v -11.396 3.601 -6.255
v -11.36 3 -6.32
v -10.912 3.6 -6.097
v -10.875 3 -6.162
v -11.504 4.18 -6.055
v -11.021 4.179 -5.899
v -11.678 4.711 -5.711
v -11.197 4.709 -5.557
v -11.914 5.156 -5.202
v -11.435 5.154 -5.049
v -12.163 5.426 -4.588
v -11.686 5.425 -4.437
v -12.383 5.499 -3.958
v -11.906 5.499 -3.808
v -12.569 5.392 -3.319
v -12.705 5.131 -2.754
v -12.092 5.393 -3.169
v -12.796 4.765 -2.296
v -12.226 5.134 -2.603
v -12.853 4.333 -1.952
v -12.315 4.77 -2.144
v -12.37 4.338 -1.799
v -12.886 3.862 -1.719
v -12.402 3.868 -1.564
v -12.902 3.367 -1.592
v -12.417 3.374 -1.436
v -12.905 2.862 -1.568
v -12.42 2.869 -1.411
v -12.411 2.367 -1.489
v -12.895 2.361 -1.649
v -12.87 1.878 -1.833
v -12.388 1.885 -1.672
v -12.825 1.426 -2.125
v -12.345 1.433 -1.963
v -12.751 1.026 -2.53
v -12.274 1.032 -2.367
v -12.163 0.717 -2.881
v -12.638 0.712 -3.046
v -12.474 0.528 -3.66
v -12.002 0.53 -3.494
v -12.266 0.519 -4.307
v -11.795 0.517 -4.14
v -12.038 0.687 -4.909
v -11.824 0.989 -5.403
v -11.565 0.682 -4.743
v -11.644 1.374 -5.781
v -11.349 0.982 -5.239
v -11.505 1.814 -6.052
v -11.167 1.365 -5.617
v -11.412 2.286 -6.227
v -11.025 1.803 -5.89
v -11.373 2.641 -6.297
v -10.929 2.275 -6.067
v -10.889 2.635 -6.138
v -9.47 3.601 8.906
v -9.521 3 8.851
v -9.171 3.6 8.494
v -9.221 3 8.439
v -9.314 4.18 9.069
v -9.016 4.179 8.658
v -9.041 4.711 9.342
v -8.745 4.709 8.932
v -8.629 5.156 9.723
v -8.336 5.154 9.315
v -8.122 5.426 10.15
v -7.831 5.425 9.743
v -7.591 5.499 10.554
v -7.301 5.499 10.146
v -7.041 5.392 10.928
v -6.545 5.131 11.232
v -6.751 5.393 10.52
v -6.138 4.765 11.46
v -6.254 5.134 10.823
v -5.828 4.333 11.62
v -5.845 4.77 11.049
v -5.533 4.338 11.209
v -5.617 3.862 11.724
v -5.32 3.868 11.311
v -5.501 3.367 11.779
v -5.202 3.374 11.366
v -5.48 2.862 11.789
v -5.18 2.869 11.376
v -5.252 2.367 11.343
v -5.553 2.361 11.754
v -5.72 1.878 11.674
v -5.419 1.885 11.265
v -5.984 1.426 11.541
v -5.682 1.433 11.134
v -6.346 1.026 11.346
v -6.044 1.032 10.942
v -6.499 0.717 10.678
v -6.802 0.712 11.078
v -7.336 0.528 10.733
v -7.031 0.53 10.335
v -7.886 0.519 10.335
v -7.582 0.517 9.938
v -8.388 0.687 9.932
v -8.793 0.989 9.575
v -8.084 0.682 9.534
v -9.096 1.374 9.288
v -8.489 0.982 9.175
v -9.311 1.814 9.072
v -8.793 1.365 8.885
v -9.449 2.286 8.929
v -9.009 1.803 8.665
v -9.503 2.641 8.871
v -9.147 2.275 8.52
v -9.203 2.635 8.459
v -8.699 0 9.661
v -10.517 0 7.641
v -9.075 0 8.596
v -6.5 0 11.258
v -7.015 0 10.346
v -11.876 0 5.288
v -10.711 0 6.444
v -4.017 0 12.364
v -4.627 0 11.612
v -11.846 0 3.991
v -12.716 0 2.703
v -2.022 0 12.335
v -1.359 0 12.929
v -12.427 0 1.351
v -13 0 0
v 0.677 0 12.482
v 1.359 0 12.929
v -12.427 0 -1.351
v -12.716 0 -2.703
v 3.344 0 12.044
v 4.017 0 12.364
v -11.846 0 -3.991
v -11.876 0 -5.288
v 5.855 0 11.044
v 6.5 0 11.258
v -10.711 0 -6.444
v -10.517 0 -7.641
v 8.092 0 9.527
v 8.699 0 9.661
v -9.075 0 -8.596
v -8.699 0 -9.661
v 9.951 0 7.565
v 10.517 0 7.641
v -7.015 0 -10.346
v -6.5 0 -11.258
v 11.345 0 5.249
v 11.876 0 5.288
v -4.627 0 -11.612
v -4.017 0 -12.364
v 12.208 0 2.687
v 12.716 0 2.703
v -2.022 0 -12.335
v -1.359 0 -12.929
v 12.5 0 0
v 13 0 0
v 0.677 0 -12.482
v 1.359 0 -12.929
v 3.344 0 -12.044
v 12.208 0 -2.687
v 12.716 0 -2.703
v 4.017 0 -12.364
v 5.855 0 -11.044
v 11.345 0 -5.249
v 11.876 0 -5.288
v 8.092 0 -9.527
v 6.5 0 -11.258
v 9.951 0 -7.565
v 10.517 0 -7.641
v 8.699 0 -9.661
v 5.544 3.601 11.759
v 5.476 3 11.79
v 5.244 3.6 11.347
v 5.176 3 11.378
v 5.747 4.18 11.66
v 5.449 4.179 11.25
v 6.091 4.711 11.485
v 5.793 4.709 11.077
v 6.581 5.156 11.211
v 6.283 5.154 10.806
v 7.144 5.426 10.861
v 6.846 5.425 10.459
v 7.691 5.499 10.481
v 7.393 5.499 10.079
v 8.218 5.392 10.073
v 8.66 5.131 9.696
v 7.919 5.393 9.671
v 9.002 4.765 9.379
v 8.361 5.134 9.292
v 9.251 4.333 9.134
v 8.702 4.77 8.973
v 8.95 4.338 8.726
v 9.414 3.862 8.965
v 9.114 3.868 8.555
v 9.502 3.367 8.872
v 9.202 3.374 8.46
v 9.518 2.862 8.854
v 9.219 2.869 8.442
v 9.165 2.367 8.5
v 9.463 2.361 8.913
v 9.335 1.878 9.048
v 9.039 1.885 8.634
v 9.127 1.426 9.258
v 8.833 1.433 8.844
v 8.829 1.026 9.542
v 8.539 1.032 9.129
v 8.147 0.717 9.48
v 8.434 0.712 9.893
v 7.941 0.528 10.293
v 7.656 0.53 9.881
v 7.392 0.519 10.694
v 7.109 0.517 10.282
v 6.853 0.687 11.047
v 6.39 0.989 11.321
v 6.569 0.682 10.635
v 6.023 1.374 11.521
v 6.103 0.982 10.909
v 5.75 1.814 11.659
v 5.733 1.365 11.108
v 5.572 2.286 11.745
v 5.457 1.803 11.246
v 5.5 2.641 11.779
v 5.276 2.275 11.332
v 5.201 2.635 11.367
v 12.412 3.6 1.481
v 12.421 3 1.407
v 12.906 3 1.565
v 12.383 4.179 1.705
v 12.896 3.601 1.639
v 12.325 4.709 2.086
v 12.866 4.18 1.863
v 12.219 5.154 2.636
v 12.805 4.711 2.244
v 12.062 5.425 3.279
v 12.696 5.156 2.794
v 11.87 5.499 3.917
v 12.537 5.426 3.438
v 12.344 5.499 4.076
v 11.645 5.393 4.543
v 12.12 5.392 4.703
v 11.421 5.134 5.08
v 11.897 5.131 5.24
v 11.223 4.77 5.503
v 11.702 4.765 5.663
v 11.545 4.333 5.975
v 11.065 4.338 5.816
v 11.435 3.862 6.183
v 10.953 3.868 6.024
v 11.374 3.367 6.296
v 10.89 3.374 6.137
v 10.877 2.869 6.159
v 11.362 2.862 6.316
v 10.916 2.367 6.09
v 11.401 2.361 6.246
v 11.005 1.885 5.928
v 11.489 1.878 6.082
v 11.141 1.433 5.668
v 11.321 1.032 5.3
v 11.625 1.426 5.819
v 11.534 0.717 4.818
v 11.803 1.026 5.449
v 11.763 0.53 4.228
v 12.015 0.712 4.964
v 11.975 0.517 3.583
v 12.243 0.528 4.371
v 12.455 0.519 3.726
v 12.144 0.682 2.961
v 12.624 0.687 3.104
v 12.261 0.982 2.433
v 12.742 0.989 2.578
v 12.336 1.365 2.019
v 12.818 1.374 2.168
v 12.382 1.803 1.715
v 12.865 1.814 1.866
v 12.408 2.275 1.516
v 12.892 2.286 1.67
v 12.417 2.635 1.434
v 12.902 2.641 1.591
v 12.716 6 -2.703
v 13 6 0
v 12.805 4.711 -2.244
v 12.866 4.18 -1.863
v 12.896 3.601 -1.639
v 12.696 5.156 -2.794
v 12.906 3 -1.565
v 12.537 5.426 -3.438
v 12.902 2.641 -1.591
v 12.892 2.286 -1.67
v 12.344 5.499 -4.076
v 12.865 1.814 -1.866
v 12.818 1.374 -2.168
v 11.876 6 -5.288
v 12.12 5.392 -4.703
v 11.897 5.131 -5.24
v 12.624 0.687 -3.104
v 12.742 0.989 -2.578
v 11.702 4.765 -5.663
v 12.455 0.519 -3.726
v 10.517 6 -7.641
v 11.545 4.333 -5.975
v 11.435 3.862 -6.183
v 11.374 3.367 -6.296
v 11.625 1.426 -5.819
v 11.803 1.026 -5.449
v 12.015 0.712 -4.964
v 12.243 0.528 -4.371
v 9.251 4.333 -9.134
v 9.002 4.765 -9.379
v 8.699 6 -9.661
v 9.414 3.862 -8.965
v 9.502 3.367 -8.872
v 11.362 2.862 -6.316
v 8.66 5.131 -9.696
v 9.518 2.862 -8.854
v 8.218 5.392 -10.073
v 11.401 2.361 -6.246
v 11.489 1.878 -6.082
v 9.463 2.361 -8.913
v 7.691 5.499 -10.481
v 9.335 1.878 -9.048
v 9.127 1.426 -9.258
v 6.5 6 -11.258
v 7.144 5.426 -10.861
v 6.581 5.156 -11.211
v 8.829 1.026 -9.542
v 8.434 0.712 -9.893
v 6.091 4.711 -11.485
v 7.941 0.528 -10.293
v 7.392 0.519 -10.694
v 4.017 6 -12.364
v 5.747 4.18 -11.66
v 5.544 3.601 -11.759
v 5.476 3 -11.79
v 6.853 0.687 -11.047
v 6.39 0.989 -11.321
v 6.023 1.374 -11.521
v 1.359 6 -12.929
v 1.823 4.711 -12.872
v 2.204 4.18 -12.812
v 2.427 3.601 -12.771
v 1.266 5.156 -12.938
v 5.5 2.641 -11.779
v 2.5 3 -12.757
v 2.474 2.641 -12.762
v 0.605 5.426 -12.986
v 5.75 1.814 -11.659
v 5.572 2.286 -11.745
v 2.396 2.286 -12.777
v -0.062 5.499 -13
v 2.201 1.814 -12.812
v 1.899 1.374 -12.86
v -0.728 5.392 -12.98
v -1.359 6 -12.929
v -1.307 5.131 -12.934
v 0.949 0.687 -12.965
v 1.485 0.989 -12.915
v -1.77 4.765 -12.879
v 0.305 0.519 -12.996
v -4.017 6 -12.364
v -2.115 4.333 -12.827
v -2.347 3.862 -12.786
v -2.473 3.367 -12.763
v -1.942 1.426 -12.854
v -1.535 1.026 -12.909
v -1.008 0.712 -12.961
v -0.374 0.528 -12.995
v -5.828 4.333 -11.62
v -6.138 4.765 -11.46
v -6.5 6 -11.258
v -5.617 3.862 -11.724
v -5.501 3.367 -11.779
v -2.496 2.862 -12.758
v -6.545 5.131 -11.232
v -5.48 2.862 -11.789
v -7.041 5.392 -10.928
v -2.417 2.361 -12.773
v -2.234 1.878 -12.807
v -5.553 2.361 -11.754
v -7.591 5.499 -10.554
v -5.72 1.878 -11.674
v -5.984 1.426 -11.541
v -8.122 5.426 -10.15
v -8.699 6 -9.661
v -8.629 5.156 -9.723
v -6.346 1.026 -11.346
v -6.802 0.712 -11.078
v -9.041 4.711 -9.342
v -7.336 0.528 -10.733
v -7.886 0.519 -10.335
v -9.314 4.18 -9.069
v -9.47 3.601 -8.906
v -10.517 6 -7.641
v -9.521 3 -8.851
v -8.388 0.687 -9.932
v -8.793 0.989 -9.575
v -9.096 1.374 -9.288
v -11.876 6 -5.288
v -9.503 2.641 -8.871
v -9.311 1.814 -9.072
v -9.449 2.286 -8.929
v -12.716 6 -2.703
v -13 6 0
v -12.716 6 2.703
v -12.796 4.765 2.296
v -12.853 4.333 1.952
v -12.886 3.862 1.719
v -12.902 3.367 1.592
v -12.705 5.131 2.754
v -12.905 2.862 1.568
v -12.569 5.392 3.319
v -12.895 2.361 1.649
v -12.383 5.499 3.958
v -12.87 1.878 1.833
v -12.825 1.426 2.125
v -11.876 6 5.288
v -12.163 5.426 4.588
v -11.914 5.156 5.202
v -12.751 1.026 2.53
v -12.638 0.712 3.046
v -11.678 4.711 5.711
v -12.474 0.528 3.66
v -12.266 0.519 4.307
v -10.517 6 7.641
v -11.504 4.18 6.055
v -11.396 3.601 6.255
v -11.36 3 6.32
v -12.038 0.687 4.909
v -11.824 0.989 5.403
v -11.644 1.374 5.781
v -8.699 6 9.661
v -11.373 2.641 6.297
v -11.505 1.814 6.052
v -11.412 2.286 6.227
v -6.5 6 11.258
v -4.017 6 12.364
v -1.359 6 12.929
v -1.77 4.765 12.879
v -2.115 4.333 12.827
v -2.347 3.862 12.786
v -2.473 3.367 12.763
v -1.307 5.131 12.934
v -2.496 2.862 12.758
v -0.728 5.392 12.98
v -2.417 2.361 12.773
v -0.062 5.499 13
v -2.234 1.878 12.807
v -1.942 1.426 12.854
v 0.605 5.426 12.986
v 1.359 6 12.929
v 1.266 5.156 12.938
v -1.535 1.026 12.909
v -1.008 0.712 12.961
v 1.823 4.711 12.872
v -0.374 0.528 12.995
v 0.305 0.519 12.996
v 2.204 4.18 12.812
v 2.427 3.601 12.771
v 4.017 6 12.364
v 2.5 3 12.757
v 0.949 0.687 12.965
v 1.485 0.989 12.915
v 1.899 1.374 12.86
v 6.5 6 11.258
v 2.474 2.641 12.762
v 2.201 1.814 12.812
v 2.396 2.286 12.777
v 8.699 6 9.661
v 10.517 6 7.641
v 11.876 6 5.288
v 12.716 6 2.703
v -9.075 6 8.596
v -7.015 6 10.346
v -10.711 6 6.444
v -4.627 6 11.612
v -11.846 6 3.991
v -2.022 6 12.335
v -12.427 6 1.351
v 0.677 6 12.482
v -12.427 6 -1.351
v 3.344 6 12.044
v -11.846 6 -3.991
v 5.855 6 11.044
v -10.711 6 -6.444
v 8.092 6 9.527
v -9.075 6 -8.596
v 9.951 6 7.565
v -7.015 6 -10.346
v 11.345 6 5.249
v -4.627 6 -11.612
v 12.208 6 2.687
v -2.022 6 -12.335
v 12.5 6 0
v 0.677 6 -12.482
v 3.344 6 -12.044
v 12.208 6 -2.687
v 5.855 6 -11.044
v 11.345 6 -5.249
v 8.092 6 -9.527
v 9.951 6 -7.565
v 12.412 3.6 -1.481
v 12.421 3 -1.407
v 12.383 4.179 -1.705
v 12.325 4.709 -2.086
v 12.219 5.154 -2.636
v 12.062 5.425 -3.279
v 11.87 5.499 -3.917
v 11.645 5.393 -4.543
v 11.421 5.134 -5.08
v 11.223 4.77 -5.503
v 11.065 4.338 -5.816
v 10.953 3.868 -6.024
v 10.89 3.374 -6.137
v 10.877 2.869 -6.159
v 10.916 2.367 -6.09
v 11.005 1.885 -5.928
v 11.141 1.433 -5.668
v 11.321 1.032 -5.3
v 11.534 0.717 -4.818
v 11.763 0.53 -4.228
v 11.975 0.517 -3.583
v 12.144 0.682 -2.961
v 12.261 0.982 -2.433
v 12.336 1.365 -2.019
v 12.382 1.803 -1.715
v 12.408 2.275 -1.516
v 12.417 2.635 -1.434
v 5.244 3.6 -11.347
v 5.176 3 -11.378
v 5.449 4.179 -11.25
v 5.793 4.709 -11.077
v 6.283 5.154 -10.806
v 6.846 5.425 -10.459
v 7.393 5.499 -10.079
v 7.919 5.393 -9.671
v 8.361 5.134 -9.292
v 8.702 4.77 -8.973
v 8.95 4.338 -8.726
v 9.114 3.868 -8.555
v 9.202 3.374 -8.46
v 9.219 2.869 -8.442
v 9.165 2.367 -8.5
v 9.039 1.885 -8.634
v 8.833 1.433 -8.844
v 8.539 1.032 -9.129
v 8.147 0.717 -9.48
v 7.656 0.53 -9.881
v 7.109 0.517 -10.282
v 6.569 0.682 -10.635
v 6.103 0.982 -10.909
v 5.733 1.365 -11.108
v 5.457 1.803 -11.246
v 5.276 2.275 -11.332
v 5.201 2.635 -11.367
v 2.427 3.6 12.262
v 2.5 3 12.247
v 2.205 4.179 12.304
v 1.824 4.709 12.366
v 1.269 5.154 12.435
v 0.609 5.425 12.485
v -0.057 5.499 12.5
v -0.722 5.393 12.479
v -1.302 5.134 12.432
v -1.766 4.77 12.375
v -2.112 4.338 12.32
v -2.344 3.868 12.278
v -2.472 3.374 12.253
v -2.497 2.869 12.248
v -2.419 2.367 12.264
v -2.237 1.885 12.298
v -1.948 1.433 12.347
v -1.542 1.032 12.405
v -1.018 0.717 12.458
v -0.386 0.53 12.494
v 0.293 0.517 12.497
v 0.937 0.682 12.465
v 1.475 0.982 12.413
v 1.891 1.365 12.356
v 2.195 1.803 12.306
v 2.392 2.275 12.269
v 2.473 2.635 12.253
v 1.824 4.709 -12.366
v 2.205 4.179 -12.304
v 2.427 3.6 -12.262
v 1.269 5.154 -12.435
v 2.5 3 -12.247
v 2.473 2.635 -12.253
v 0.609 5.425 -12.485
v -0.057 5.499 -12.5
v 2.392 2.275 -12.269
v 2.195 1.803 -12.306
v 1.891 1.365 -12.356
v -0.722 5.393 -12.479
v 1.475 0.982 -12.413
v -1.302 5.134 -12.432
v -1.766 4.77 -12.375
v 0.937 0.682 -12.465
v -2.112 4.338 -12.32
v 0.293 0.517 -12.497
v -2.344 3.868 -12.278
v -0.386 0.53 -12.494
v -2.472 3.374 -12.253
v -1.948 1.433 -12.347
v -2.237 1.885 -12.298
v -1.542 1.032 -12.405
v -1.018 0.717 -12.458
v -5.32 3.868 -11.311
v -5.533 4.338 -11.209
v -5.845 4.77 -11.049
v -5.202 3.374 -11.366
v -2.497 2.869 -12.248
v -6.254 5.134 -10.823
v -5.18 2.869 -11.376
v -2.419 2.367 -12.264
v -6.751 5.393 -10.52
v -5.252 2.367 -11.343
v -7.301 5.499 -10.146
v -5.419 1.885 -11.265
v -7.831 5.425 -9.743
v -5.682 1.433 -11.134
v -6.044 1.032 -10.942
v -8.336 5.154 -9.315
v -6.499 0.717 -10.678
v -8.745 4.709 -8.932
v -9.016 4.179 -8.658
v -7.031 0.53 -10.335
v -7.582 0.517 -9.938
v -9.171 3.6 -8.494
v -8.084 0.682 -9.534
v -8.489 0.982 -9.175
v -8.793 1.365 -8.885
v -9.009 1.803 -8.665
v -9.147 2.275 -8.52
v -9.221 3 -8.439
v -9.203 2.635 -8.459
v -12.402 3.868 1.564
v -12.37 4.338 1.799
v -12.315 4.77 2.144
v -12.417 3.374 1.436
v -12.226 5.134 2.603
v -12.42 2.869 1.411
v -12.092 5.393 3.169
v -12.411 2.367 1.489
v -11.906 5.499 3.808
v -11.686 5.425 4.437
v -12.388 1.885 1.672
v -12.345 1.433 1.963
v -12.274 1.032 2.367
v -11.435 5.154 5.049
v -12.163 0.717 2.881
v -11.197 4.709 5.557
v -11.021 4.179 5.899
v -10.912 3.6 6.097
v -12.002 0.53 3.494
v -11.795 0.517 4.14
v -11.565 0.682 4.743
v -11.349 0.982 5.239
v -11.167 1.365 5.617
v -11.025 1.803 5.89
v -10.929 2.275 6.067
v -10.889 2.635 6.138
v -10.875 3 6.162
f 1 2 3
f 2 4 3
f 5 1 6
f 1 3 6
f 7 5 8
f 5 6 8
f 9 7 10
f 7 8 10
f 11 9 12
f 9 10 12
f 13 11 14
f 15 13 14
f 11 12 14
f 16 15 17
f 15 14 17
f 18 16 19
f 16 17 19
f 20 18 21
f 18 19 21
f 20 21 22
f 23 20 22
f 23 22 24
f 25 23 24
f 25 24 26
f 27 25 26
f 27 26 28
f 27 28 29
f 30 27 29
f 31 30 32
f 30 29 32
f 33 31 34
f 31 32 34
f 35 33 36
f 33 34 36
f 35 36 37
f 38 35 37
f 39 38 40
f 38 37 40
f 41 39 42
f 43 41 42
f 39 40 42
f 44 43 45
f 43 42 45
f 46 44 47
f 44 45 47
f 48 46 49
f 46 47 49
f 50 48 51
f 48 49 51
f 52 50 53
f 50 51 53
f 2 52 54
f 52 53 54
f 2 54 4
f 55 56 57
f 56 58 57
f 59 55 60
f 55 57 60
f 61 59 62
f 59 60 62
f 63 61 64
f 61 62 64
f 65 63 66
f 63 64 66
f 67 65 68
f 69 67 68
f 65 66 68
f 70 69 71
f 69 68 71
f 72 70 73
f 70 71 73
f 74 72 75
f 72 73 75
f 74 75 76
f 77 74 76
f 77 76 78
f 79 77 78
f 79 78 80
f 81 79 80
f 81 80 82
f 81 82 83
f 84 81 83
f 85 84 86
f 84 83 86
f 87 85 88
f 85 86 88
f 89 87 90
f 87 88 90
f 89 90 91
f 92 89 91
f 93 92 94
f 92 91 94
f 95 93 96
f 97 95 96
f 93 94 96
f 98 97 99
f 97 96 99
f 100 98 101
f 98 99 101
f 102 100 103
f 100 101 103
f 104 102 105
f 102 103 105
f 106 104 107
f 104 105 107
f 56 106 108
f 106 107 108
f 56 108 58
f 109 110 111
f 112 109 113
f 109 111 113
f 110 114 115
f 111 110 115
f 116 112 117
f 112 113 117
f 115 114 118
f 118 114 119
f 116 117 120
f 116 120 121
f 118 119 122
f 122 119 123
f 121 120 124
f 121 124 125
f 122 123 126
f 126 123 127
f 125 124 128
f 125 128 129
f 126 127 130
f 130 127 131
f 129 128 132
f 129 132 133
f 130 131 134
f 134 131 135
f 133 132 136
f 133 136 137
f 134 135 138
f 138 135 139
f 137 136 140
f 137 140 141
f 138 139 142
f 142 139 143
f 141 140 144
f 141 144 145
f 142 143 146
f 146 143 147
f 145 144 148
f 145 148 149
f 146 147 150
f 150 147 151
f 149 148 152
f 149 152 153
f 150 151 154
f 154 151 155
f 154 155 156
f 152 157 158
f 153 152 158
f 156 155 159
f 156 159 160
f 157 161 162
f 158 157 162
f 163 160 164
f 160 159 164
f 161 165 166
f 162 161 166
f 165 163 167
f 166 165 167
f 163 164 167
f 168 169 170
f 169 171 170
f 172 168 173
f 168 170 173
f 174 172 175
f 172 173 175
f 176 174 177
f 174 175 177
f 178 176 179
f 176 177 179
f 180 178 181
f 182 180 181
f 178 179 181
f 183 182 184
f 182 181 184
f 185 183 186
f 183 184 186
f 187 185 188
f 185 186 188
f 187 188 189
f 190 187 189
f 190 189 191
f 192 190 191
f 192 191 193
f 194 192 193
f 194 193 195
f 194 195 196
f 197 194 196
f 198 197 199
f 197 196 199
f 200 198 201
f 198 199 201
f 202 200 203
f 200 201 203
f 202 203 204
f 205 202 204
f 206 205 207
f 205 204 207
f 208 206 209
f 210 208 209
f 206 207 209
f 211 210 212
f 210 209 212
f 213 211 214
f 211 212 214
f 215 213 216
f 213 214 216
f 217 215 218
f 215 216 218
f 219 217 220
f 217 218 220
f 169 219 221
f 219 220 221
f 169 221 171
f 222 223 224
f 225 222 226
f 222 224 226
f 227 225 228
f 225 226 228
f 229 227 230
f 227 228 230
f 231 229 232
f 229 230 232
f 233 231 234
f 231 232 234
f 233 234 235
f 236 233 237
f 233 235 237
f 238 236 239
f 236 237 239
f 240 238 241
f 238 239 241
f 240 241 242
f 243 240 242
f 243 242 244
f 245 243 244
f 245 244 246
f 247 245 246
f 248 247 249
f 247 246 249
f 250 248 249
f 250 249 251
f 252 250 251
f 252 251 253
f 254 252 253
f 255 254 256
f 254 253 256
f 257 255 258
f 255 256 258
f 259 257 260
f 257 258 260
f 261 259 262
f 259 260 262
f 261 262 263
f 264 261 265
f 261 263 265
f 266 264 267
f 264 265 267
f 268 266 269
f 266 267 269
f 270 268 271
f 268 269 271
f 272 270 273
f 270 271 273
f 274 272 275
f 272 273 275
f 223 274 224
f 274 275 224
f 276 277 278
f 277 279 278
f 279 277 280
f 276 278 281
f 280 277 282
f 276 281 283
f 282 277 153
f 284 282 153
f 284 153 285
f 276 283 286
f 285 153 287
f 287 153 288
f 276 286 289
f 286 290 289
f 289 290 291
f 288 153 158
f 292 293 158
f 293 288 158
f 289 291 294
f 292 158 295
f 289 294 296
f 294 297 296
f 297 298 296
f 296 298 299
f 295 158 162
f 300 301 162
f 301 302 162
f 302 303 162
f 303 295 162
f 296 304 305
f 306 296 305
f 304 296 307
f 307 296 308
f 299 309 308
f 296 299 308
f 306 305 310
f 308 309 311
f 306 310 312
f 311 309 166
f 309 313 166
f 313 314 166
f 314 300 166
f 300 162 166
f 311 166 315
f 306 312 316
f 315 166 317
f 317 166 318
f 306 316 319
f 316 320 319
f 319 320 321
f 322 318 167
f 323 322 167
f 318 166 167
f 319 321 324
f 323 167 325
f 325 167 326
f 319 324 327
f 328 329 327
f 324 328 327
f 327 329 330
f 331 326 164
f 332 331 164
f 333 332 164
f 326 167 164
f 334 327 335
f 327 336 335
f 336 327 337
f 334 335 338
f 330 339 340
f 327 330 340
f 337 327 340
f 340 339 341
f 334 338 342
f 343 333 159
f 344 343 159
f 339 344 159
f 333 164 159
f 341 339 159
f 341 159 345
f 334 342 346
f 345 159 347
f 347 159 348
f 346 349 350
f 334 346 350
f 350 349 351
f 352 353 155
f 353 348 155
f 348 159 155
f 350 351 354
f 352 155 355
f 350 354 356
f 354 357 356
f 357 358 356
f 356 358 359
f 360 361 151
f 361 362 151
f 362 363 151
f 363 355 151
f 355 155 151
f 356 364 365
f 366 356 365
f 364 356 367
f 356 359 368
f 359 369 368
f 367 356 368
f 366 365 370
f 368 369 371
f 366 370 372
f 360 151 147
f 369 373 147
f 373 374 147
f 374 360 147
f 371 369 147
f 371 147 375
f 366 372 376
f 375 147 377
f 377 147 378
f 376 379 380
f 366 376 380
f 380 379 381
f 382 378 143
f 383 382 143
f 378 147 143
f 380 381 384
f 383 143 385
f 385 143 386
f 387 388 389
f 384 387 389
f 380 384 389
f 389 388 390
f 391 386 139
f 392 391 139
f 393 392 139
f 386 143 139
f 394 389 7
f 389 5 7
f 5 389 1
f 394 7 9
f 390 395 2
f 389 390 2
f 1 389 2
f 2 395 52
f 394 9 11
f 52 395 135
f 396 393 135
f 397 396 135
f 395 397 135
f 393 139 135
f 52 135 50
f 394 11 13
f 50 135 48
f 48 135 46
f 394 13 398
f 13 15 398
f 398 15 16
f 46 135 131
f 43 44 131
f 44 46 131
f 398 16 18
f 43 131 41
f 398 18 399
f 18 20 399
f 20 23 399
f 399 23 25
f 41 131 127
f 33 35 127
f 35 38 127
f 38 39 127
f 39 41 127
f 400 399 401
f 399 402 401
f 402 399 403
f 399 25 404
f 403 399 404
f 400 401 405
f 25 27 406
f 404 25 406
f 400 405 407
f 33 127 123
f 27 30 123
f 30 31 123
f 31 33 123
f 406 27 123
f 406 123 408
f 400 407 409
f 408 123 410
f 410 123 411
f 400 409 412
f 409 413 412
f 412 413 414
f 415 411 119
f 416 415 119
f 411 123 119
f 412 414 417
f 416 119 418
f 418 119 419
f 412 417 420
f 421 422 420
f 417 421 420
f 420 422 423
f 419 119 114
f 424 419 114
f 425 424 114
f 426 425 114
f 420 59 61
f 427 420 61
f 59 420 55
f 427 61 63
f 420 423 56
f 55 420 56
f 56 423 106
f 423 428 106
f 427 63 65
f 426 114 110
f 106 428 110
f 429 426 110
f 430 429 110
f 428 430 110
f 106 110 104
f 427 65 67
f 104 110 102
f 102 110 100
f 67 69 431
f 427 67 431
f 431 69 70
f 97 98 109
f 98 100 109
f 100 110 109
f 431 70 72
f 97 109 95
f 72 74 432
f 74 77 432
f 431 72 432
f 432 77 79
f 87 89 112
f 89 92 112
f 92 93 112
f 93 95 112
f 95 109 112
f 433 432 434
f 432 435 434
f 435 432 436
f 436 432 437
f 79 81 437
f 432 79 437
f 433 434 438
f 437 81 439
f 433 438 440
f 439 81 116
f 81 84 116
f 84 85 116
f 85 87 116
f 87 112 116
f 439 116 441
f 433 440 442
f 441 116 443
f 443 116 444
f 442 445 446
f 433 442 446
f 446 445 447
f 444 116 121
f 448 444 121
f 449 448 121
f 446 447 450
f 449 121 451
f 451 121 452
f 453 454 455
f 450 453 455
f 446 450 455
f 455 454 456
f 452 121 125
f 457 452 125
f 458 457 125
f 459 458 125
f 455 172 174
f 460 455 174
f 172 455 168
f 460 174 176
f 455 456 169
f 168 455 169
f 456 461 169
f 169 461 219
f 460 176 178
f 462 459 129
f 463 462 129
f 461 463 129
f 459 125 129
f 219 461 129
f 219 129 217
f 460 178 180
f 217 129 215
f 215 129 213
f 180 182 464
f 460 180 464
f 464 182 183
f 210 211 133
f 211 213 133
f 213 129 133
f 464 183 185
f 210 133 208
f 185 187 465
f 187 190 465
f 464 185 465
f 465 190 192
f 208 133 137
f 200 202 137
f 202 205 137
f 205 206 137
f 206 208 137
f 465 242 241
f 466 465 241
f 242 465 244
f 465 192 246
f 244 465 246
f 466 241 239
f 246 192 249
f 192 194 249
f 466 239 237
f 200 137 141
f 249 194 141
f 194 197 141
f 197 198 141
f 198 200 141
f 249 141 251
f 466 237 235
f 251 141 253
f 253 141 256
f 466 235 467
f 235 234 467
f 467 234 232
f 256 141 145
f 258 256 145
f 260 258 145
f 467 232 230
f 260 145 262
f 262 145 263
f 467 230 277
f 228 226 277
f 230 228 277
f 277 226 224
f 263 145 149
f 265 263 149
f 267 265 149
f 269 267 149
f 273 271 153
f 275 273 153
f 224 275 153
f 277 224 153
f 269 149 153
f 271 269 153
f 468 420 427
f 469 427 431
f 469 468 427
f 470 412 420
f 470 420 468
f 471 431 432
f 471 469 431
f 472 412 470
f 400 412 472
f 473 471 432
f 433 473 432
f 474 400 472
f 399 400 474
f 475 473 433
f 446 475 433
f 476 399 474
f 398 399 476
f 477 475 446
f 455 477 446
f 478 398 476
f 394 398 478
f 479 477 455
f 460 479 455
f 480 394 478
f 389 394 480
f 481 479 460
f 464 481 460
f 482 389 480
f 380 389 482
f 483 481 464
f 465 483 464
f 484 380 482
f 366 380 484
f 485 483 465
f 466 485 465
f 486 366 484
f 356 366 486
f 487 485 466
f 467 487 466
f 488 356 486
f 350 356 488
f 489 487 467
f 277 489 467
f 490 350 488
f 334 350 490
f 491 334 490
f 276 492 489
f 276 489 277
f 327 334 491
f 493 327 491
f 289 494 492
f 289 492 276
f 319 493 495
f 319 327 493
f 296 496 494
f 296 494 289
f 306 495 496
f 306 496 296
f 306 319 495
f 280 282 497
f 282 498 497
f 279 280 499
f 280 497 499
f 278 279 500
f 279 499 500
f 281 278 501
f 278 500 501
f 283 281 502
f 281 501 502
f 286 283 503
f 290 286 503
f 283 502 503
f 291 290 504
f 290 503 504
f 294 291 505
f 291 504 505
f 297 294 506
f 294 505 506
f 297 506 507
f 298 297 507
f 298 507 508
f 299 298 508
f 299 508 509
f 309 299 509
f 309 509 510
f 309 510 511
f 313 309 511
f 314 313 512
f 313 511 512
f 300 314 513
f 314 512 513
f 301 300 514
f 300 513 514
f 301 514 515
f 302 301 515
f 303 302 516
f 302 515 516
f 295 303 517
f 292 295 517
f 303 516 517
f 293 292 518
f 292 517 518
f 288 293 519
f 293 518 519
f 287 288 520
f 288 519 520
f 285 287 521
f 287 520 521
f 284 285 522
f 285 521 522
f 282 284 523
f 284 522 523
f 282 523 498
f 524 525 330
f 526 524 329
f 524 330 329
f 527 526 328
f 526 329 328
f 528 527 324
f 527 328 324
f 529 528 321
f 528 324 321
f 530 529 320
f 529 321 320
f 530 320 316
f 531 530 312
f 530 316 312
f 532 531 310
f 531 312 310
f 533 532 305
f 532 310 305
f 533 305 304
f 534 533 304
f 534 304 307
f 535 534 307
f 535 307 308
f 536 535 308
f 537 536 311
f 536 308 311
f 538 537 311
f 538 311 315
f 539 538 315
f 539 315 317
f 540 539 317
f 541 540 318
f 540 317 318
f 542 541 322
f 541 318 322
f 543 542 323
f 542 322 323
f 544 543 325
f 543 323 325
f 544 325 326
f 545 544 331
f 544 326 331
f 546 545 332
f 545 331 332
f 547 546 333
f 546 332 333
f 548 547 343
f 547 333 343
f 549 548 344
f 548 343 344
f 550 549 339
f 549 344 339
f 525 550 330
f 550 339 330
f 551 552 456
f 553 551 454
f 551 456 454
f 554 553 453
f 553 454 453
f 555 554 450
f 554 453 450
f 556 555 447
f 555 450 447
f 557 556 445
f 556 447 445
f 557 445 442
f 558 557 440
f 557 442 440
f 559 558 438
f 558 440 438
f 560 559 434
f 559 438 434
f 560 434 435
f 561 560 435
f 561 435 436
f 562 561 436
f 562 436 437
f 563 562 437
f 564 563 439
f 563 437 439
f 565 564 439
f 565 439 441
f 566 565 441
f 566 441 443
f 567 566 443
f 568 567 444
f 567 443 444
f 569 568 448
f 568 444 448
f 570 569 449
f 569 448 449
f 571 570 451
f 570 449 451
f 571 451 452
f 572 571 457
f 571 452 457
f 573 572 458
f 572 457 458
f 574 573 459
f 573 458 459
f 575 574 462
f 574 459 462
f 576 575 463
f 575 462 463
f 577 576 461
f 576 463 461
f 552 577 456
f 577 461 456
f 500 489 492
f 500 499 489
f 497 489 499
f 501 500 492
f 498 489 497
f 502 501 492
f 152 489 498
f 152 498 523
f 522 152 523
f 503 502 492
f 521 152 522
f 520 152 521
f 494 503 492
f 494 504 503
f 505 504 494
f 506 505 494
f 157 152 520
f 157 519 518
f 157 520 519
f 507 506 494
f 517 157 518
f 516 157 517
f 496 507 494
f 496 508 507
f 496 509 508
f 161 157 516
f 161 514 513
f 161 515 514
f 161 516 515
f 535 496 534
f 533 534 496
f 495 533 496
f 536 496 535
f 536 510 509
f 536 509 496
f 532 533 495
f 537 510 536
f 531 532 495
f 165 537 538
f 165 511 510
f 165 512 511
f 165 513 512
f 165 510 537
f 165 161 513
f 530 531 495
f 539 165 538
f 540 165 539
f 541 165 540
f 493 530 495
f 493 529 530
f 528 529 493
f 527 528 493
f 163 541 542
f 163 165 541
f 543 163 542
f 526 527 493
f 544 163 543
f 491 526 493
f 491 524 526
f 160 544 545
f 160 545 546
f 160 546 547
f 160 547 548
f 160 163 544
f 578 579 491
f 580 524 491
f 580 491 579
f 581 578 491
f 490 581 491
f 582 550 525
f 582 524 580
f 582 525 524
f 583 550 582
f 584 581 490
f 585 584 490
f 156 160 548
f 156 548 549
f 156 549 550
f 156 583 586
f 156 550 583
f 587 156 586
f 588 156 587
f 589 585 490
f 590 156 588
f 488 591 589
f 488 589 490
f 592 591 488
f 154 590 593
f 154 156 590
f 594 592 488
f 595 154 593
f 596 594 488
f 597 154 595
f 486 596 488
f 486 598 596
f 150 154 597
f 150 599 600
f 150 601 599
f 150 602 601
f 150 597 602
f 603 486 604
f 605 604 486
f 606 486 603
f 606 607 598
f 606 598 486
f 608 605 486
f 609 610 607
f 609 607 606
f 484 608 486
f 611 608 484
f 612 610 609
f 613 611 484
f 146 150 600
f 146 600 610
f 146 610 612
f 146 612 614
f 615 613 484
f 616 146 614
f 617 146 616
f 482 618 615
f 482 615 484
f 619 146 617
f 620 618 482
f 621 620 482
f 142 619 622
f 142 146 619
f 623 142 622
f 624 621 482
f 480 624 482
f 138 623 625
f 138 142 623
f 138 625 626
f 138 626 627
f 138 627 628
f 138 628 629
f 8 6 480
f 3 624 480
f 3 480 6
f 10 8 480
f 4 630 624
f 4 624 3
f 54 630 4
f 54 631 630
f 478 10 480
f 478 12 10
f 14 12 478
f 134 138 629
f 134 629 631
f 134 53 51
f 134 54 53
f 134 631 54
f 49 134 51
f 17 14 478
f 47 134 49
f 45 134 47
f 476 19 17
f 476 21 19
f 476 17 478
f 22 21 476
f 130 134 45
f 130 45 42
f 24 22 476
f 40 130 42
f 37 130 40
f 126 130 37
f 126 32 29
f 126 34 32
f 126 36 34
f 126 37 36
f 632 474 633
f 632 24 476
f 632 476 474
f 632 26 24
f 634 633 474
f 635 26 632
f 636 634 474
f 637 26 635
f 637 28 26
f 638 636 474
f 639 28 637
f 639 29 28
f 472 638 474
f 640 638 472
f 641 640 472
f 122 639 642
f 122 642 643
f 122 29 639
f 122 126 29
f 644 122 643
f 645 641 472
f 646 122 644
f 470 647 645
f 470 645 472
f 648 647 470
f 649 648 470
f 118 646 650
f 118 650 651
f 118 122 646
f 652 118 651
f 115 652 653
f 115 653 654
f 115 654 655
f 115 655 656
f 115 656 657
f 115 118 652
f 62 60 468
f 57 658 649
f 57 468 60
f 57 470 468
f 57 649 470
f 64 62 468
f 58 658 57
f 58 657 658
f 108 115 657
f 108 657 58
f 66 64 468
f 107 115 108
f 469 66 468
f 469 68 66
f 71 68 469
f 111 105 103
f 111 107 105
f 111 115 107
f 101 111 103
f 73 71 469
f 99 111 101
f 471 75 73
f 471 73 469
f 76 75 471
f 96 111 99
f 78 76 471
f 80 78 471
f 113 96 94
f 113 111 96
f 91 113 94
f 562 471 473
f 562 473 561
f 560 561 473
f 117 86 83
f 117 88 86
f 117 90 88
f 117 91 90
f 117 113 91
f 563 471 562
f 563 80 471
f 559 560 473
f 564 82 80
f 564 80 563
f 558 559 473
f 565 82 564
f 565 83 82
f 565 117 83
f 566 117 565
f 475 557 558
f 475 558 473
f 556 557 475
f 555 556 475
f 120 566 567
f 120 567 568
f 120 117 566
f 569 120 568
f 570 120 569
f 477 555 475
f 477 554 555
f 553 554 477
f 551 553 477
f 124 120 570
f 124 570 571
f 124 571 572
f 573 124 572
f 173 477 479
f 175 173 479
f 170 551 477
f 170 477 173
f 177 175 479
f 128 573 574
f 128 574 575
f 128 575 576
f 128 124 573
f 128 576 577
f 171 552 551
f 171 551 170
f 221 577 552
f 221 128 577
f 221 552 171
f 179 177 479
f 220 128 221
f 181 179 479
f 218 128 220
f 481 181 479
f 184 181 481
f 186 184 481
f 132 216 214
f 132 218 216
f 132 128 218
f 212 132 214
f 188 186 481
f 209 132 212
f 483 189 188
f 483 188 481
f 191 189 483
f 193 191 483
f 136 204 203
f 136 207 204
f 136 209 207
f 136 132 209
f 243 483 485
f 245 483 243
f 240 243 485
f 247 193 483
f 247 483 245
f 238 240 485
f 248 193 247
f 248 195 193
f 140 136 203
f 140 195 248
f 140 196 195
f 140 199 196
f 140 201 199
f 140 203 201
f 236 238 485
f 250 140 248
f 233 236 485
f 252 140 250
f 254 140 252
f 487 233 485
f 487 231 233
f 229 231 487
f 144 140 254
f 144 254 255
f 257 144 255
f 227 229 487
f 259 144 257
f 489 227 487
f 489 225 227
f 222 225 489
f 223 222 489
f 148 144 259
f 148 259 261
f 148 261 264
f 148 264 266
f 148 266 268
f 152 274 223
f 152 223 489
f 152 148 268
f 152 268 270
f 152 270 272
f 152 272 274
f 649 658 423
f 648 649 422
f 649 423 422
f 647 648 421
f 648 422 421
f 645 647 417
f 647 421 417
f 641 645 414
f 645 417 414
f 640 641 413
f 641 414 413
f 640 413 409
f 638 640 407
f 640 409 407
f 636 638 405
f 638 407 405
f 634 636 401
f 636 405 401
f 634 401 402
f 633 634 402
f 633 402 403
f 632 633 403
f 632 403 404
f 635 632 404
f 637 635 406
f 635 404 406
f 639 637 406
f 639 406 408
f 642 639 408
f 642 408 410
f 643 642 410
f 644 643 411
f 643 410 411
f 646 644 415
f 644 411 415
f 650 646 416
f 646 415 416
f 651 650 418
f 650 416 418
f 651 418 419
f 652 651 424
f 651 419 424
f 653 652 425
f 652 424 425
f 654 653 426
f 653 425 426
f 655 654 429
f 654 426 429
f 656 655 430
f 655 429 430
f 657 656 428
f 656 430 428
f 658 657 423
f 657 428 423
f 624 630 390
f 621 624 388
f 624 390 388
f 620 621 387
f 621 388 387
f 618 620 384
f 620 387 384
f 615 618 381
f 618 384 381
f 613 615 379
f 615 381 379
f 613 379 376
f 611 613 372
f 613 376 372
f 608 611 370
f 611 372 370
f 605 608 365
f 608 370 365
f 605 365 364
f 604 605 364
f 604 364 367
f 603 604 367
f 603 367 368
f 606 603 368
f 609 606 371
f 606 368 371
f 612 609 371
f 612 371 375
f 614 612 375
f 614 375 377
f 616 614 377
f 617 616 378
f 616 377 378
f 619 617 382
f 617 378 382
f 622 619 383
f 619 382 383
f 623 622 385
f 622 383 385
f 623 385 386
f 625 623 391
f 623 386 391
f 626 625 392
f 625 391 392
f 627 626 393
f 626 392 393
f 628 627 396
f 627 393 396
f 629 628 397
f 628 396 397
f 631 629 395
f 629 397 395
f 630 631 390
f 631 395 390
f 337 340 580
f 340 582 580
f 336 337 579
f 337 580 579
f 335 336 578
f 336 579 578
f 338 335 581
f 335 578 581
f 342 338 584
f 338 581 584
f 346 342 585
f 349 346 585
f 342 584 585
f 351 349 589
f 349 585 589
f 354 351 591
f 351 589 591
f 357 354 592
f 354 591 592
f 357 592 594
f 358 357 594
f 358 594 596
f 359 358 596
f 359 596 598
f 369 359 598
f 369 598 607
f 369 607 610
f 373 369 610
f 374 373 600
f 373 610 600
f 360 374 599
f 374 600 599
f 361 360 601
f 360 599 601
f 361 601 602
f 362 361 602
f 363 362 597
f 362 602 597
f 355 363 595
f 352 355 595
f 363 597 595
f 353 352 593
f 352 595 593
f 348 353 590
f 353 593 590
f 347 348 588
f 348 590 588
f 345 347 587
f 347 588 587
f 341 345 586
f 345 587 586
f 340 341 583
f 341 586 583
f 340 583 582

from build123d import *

# Parameters (mm, degrees)
SKETCH1_R           = 13
SKETCH1_R_2         = 12.5
BOSS_EXTRUDE2_DEPTH = 6
SKETCH5_R           = 2.5
CUT_EXTRUDE1_DEPTH  = 14
CIRPATTERN1_COUNT   = 5


with BuildPart() as part:
    # Sketch1 → Boss-Extrude2 (new body)
    with BuildSketch(Plane(origin=(0, 0, 0), x_dir=(1, 0, 0), z_dir=(0, 1, 0))):
        Circle(SKETCH1_R)
        Circle(SKETCH1_R_2, mode=Mode.SUBTRACT)
    extrude(amount=BOSS_EXTRUDE2_DEPTH)

    # Sketch5 → Cut-Extrude1 (cut, symmetric)
    with BuildSketch(Plane.XY):
        with Locations((0, 3)):
            Circle(SKETCH5_R)
    cut_extrude1 = extrude(amount=CUT_EXTRUDE1_DEPTH, both=True, mode=Mode.SUBTRACT)

    # CirPattern1: Cut-Extrude1 ×5 about axis
    cirpattern1_axis = Axis((0, 6, 0), (0, -1, 0))
    for i in range(1, CIRPATTERN1_COUNT):
        add(cut_extrude1.rotate(cirpattern1_axis, i * 360 / CIRPATTERN1_COUNT), mode=Mode.SUBTRACT)


solid = part.part
